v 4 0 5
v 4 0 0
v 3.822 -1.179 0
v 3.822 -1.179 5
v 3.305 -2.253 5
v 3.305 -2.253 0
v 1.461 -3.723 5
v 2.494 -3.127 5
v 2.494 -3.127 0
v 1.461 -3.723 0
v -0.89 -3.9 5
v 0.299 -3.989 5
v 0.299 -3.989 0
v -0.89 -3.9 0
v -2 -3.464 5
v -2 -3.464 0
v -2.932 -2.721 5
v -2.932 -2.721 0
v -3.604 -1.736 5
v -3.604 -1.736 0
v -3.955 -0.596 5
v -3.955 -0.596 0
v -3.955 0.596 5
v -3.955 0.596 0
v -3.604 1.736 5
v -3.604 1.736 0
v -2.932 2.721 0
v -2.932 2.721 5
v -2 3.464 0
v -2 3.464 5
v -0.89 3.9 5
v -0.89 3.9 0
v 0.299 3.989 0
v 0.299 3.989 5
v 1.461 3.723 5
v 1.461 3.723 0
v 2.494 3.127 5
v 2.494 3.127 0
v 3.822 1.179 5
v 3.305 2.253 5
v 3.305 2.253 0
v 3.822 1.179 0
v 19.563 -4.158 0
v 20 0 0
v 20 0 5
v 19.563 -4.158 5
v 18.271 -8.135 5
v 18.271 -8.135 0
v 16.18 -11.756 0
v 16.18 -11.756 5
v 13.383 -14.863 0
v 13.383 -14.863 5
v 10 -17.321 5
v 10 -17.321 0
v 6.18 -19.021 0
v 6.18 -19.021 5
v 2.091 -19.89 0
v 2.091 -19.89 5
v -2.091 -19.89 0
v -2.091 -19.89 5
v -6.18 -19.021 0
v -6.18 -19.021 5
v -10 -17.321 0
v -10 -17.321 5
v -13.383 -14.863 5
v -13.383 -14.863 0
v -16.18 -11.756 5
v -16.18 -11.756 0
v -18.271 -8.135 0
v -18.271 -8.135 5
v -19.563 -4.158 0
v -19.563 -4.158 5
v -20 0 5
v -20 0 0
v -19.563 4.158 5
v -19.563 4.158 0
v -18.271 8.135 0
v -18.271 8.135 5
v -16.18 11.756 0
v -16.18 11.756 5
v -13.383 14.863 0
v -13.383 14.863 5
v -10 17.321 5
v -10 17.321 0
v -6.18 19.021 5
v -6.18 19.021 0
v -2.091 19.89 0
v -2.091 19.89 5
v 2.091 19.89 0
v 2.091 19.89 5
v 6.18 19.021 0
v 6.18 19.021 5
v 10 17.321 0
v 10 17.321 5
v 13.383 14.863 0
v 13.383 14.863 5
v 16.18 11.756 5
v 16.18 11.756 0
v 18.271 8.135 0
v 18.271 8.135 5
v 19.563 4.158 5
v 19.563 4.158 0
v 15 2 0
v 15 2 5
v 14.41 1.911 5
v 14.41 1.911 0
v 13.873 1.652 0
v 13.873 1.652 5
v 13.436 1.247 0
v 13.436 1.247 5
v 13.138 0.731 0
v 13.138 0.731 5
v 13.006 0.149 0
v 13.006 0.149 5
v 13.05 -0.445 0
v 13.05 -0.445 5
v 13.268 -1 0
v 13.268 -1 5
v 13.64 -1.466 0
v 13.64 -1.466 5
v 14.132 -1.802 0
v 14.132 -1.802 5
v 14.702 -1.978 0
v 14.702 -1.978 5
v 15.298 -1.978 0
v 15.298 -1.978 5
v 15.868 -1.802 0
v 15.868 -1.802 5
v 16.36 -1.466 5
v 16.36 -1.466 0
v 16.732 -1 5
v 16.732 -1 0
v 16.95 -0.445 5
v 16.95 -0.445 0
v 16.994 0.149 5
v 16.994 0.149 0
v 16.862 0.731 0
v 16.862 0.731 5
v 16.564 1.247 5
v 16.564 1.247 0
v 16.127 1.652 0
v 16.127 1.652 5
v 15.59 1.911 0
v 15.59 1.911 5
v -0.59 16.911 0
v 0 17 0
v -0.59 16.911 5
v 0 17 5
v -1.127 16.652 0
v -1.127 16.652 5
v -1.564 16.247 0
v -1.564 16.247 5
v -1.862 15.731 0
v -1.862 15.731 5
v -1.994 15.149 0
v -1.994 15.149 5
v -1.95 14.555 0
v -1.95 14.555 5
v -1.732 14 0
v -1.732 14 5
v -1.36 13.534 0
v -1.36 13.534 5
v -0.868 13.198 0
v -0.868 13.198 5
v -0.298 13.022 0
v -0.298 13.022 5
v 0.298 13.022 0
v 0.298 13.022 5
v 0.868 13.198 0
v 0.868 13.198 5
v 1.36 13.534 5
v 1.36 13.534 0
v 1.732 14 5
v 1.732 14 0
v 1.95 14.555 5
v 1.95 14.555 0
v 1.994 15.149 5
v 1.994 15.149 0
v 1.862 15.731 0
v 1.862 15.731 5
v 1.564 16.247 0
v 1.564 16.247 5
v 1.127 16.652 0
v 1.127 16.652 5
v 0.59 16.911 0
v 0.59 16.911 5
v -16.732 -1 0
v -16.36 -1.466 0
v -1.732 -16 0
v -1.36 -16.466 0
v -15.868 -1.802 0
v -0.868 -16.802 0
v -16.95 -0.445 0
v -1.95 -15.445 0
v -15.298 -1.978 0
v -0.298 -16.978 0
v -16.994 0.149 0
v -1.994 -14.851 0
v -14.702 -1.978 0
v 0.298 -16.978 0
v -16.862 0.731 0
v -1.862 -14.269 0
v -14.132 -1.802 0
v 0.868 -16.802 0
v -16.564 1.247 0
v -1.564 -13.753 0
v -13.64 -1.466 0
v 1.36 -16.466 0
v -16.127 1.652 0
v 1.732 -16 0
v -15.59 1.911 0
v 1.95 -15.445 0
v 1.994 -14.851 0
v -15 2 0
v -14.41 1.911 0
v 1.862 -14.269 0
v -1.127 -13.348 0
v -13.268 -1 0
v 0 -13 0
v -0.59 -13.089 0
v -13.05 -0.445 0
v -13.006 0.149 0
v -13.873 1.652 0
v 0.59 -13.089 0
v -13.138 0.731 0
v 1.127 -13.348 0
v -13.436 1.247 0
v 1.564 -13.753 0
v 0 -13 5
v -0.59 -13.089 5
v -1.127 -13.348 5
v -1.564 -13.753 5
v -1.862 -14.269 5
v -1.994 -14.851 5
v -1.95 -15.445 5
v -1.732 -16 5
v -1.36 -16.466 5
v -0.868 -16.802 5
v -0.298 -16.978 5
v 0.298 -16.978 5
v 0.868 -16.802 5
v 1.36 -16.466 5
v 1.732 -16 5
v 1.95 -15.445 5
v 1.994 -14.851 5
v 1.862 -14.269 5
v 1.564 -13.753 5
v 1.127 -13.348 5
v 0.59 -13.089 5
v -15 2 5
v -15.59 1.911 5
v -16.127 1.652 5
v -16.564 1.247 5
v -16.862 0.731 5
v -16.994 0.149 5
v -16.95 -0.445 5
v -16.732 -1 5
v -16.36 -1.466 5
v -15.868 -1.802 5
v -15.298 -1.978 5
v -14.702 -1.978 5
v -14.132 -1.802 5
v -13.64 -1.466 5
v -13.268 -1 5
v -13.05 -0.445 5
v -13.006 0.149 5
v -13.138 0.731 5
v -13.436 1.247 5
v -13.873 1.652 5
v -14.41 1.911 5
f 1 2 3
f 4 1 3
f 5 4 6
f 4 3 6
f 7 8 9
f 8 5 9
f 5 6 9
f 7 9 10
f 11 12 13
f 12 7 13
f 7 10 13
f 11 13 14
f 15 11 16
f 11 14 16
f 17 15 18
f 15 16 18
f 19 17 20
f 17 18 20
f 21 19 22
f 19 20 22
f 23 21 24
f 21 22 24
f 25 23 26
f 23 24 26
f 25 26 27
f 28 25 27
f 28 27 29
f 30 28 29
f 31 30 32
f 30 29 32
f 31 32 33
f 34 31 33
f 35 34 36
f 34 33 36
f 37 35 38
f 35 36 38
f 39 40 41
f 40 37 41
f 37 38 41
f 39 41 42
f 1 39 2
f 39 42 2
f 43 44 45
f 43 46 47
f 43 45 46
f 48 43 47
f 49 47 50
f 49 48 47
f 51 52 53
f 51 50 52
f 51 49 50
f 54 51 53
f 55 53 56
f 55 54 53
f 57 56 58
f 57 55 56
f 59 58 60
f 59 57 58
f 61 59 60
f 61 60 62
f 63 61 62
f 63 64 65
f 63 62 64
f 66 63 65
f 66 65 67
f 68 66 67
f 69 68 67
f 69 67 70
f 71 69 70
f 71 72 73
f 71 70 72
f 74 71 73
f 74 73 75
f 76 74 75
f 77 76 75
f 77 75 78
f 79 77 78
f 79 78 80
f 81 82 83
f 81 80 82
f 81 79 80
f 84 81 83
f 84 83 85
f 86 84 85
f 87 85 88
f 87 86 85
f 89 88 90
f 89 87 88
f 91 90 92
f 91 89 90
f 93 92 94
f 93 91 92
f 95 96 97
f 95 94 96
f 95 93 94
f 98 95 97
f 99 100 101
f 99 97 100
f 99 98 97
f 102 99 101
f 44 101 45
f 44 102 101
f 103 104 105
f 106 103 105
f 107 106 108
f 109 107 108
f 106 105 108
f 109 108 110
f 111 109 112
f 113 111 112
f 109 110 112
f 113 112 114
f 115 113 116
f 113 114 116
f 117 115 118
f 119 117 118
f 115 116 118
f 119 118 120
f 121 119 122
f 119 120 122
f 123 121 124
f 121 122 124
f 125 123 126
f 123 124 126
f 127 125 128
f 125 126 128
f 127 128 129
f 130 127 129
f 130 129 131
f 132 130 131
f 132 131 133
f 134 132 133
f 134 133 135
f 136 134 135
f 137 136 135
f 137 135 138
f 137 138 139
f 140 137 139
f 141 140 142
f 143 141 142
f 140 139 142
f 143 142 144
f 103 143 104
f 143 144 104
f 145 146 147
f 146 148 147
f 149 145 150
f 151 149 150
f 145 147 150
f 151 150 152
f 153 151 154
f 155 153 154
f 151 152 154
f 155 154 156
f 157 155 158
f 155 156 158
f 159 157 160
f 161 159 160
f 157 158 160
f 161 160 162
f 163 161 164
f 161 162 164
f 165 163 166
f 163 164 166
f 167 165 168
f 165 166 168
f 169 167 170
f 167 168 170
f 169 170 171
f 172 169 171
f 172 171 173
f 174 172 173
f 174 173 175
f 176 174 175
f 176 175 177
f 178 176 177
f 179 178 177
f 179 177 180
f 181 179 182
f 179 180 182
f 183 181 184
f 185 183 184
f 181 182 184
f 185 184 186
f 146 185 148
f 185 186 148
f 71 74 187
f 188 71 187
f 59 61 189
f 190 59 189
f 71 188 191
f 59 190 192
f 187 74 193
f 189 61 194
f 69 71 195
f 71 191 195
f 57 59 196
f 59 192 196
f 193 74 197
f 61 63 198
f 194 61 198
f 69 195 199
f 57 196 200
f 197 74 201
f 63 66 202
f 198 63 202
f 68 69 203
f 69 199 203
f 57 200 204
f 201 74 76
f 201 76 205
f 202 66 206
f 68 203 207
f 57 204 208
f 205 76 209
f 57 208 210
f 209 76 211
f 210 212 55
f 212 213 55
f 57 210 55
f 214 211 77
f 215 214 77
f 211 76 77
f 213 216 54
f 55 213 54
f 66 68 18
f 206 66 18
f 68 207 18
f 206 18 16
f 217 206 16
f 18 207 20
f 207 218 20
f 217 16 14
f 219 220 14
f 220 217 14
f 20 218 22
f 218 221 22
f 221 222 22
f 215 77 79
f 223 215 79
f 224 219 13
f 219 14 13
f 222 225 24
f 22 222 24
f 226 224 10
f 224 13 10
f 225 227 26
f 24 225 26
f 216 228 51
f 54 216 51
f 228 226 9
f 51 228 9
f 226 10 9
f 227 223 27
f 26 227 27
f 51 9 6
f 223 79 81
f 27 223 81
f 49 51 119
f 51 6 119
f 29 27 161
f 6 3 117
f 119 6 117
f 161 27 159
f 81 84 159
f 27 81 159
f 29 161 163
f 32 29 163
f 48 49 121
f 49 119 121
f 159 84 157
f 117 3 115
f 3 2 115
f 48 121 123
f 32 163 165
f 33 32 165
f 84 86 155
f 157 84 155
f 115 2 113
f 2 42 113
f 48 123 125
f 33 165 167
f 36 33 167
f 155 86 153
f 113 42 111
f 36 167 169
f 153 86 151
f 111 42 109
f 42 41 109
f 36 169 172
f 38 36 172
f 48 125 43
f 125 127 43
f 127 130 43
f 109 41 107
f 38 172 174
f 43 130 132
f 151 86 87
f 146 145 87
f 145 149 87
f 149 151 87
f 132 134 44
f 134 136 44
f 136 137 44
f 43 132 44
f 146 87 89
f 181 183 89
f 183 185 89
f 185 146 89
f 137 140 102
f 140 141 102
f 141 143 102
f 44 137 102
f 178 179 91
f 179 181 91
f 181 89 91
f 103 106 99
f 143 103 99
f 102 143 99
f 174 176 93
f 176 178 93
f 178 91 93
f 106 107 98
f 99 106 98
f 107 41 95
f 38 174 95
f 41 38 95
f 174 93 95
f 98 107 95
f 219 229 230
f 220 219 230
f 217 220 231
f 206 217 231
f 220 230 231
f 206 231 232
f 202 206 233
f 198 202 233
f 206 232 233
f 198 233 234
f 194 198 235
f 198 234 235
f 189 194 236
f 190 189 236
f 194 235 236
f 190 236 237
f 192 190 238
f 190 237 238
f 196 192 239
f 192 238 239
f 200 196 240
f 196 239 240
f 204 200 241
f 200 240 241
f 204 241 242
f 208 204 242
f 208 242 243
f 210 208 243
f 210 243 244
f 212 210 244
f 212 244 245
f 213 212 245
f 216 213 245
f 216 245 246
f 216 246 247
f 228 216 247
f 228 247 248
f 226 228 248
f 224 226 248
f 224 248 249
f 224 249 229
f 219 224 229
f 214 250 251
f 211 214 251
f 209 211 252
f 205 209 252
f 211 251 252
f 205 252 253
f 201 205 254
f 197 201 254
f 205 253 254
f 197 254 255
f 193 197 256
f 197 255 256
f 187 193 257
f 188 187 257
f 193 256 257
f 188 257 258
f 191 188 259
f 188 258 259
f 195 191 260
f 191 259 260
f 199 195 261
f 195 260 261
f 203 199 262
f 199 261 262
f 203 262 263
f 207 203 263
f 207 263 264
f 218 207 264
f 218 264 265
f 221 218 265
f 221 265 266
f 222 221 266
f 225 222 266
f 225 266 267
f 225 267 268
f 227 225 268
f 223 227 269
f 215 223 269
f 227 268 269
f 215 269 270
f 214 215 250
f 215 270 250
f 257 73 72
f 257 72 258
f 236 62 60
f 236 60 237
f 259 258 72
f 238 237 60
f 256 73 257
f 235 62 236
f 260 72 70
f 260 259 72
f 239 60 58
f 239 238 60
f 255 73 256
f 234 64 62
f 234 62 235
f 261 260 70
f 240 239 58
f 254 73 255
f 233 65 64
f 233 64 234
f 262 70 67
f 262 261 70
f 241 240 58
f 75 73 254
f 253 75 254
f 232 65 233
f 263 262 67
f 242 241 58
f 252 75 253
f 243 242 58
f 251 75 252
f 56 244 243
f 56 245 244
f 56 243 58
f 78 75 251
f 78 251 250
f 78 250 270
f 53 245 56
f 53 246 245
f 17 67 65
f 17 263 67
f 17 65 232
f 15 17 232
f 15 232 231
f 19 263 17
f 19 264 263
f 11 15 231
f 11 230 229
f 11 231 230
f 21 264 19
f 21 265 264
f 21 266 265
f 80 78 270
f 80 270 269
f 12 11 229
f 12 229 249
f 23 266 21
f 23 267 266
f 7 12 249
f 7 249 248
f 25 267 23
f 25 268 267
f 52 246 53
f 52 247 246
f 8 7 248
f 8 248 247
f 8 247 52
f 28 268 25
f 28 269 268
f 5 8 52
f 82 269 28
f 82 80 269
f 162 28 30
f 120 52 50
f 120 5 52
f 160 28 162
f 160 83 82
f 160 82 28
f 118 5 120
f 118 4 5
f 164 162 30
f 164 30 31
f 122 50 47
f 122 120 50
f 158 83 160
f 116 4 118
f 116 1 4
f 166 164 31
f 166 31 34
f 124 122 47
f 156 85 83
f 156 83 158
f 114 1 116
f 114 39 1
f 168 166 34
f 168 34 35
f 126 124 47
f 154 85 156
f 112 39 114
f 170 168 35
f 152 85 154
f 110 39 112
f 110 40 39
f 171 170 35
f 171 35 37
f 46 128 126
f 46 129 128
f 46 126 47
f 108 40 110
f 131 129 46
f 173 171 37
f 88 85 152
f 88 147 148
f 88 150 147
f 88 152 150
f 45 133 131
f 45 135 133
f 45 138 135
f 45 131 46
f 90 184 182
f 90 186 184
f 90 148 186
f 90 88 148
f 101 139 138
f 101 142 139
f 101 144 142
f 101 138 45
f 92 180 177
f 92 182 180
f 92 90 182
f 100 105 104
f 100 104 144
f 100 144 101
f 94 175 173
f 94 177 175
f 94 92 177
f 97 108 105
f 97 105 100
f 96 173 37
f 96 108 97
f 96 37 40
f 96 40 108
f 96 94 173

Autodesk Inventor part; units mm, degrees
ref_plane "YZ Plane" through (0, 0, 0) normal (1, 0, 0) x (0, 1, 0)
ref_plane "XZ Plane" through (0, 0, 0) normal (0, 1, 0) x (-1, 0, 0)
ref_plane "XY Plane" through (0, 0, 0) normal (0, 0, 1) x (1, 0, 0)
sketch "Boceto1" plane through (0, 0, 0) normal (0, 0, 1) x (1, 0, 0)
  circle A0 centre (0, 0) radius 20
  circle A1 centre (0, 0) radius 4
  dimension "d0" = 40
  dimension "d42" = 8
extrude "Extrusión1" add sketch "Boceto1" along normal blind 5
sketch "Boceto3" plane through (0, 0, 0) normal (0, 0, -1) x (-1, 0, 0)
  circle A0 centre (0, 15) radius 2
  circle A1 centre (-15, 0) radius 2
  circle A2 centre (15, 0) radius 2
  circle A3 centre (0, -15) radius 2
  point P0 (0, 0)
  dimension "d6" = 4
  dimension "d7" = 4
  dimension "d8" = 4
  dimension "d9" = 4
  dimension "d10" = 15
  dimension "d11" = 15
  dimension "d12" = 15
  dimension "d13" = 15
hole "Agujero1" at (0, 15, 0) direction (0, 0, 1) diameter 4 end through all
hole "Agujero2" at (15, 0, 0) direction (0, 0, 1) diameter 4 end through all
hole "Agujero3" at (-15, 0, 0) direction (0, 0, 1) diameter 4 end through all
hole "Agujero4" at (0, -15, 0) direction (0, 0, 1) diameter 4 end through all
properties part number "Brida1"
